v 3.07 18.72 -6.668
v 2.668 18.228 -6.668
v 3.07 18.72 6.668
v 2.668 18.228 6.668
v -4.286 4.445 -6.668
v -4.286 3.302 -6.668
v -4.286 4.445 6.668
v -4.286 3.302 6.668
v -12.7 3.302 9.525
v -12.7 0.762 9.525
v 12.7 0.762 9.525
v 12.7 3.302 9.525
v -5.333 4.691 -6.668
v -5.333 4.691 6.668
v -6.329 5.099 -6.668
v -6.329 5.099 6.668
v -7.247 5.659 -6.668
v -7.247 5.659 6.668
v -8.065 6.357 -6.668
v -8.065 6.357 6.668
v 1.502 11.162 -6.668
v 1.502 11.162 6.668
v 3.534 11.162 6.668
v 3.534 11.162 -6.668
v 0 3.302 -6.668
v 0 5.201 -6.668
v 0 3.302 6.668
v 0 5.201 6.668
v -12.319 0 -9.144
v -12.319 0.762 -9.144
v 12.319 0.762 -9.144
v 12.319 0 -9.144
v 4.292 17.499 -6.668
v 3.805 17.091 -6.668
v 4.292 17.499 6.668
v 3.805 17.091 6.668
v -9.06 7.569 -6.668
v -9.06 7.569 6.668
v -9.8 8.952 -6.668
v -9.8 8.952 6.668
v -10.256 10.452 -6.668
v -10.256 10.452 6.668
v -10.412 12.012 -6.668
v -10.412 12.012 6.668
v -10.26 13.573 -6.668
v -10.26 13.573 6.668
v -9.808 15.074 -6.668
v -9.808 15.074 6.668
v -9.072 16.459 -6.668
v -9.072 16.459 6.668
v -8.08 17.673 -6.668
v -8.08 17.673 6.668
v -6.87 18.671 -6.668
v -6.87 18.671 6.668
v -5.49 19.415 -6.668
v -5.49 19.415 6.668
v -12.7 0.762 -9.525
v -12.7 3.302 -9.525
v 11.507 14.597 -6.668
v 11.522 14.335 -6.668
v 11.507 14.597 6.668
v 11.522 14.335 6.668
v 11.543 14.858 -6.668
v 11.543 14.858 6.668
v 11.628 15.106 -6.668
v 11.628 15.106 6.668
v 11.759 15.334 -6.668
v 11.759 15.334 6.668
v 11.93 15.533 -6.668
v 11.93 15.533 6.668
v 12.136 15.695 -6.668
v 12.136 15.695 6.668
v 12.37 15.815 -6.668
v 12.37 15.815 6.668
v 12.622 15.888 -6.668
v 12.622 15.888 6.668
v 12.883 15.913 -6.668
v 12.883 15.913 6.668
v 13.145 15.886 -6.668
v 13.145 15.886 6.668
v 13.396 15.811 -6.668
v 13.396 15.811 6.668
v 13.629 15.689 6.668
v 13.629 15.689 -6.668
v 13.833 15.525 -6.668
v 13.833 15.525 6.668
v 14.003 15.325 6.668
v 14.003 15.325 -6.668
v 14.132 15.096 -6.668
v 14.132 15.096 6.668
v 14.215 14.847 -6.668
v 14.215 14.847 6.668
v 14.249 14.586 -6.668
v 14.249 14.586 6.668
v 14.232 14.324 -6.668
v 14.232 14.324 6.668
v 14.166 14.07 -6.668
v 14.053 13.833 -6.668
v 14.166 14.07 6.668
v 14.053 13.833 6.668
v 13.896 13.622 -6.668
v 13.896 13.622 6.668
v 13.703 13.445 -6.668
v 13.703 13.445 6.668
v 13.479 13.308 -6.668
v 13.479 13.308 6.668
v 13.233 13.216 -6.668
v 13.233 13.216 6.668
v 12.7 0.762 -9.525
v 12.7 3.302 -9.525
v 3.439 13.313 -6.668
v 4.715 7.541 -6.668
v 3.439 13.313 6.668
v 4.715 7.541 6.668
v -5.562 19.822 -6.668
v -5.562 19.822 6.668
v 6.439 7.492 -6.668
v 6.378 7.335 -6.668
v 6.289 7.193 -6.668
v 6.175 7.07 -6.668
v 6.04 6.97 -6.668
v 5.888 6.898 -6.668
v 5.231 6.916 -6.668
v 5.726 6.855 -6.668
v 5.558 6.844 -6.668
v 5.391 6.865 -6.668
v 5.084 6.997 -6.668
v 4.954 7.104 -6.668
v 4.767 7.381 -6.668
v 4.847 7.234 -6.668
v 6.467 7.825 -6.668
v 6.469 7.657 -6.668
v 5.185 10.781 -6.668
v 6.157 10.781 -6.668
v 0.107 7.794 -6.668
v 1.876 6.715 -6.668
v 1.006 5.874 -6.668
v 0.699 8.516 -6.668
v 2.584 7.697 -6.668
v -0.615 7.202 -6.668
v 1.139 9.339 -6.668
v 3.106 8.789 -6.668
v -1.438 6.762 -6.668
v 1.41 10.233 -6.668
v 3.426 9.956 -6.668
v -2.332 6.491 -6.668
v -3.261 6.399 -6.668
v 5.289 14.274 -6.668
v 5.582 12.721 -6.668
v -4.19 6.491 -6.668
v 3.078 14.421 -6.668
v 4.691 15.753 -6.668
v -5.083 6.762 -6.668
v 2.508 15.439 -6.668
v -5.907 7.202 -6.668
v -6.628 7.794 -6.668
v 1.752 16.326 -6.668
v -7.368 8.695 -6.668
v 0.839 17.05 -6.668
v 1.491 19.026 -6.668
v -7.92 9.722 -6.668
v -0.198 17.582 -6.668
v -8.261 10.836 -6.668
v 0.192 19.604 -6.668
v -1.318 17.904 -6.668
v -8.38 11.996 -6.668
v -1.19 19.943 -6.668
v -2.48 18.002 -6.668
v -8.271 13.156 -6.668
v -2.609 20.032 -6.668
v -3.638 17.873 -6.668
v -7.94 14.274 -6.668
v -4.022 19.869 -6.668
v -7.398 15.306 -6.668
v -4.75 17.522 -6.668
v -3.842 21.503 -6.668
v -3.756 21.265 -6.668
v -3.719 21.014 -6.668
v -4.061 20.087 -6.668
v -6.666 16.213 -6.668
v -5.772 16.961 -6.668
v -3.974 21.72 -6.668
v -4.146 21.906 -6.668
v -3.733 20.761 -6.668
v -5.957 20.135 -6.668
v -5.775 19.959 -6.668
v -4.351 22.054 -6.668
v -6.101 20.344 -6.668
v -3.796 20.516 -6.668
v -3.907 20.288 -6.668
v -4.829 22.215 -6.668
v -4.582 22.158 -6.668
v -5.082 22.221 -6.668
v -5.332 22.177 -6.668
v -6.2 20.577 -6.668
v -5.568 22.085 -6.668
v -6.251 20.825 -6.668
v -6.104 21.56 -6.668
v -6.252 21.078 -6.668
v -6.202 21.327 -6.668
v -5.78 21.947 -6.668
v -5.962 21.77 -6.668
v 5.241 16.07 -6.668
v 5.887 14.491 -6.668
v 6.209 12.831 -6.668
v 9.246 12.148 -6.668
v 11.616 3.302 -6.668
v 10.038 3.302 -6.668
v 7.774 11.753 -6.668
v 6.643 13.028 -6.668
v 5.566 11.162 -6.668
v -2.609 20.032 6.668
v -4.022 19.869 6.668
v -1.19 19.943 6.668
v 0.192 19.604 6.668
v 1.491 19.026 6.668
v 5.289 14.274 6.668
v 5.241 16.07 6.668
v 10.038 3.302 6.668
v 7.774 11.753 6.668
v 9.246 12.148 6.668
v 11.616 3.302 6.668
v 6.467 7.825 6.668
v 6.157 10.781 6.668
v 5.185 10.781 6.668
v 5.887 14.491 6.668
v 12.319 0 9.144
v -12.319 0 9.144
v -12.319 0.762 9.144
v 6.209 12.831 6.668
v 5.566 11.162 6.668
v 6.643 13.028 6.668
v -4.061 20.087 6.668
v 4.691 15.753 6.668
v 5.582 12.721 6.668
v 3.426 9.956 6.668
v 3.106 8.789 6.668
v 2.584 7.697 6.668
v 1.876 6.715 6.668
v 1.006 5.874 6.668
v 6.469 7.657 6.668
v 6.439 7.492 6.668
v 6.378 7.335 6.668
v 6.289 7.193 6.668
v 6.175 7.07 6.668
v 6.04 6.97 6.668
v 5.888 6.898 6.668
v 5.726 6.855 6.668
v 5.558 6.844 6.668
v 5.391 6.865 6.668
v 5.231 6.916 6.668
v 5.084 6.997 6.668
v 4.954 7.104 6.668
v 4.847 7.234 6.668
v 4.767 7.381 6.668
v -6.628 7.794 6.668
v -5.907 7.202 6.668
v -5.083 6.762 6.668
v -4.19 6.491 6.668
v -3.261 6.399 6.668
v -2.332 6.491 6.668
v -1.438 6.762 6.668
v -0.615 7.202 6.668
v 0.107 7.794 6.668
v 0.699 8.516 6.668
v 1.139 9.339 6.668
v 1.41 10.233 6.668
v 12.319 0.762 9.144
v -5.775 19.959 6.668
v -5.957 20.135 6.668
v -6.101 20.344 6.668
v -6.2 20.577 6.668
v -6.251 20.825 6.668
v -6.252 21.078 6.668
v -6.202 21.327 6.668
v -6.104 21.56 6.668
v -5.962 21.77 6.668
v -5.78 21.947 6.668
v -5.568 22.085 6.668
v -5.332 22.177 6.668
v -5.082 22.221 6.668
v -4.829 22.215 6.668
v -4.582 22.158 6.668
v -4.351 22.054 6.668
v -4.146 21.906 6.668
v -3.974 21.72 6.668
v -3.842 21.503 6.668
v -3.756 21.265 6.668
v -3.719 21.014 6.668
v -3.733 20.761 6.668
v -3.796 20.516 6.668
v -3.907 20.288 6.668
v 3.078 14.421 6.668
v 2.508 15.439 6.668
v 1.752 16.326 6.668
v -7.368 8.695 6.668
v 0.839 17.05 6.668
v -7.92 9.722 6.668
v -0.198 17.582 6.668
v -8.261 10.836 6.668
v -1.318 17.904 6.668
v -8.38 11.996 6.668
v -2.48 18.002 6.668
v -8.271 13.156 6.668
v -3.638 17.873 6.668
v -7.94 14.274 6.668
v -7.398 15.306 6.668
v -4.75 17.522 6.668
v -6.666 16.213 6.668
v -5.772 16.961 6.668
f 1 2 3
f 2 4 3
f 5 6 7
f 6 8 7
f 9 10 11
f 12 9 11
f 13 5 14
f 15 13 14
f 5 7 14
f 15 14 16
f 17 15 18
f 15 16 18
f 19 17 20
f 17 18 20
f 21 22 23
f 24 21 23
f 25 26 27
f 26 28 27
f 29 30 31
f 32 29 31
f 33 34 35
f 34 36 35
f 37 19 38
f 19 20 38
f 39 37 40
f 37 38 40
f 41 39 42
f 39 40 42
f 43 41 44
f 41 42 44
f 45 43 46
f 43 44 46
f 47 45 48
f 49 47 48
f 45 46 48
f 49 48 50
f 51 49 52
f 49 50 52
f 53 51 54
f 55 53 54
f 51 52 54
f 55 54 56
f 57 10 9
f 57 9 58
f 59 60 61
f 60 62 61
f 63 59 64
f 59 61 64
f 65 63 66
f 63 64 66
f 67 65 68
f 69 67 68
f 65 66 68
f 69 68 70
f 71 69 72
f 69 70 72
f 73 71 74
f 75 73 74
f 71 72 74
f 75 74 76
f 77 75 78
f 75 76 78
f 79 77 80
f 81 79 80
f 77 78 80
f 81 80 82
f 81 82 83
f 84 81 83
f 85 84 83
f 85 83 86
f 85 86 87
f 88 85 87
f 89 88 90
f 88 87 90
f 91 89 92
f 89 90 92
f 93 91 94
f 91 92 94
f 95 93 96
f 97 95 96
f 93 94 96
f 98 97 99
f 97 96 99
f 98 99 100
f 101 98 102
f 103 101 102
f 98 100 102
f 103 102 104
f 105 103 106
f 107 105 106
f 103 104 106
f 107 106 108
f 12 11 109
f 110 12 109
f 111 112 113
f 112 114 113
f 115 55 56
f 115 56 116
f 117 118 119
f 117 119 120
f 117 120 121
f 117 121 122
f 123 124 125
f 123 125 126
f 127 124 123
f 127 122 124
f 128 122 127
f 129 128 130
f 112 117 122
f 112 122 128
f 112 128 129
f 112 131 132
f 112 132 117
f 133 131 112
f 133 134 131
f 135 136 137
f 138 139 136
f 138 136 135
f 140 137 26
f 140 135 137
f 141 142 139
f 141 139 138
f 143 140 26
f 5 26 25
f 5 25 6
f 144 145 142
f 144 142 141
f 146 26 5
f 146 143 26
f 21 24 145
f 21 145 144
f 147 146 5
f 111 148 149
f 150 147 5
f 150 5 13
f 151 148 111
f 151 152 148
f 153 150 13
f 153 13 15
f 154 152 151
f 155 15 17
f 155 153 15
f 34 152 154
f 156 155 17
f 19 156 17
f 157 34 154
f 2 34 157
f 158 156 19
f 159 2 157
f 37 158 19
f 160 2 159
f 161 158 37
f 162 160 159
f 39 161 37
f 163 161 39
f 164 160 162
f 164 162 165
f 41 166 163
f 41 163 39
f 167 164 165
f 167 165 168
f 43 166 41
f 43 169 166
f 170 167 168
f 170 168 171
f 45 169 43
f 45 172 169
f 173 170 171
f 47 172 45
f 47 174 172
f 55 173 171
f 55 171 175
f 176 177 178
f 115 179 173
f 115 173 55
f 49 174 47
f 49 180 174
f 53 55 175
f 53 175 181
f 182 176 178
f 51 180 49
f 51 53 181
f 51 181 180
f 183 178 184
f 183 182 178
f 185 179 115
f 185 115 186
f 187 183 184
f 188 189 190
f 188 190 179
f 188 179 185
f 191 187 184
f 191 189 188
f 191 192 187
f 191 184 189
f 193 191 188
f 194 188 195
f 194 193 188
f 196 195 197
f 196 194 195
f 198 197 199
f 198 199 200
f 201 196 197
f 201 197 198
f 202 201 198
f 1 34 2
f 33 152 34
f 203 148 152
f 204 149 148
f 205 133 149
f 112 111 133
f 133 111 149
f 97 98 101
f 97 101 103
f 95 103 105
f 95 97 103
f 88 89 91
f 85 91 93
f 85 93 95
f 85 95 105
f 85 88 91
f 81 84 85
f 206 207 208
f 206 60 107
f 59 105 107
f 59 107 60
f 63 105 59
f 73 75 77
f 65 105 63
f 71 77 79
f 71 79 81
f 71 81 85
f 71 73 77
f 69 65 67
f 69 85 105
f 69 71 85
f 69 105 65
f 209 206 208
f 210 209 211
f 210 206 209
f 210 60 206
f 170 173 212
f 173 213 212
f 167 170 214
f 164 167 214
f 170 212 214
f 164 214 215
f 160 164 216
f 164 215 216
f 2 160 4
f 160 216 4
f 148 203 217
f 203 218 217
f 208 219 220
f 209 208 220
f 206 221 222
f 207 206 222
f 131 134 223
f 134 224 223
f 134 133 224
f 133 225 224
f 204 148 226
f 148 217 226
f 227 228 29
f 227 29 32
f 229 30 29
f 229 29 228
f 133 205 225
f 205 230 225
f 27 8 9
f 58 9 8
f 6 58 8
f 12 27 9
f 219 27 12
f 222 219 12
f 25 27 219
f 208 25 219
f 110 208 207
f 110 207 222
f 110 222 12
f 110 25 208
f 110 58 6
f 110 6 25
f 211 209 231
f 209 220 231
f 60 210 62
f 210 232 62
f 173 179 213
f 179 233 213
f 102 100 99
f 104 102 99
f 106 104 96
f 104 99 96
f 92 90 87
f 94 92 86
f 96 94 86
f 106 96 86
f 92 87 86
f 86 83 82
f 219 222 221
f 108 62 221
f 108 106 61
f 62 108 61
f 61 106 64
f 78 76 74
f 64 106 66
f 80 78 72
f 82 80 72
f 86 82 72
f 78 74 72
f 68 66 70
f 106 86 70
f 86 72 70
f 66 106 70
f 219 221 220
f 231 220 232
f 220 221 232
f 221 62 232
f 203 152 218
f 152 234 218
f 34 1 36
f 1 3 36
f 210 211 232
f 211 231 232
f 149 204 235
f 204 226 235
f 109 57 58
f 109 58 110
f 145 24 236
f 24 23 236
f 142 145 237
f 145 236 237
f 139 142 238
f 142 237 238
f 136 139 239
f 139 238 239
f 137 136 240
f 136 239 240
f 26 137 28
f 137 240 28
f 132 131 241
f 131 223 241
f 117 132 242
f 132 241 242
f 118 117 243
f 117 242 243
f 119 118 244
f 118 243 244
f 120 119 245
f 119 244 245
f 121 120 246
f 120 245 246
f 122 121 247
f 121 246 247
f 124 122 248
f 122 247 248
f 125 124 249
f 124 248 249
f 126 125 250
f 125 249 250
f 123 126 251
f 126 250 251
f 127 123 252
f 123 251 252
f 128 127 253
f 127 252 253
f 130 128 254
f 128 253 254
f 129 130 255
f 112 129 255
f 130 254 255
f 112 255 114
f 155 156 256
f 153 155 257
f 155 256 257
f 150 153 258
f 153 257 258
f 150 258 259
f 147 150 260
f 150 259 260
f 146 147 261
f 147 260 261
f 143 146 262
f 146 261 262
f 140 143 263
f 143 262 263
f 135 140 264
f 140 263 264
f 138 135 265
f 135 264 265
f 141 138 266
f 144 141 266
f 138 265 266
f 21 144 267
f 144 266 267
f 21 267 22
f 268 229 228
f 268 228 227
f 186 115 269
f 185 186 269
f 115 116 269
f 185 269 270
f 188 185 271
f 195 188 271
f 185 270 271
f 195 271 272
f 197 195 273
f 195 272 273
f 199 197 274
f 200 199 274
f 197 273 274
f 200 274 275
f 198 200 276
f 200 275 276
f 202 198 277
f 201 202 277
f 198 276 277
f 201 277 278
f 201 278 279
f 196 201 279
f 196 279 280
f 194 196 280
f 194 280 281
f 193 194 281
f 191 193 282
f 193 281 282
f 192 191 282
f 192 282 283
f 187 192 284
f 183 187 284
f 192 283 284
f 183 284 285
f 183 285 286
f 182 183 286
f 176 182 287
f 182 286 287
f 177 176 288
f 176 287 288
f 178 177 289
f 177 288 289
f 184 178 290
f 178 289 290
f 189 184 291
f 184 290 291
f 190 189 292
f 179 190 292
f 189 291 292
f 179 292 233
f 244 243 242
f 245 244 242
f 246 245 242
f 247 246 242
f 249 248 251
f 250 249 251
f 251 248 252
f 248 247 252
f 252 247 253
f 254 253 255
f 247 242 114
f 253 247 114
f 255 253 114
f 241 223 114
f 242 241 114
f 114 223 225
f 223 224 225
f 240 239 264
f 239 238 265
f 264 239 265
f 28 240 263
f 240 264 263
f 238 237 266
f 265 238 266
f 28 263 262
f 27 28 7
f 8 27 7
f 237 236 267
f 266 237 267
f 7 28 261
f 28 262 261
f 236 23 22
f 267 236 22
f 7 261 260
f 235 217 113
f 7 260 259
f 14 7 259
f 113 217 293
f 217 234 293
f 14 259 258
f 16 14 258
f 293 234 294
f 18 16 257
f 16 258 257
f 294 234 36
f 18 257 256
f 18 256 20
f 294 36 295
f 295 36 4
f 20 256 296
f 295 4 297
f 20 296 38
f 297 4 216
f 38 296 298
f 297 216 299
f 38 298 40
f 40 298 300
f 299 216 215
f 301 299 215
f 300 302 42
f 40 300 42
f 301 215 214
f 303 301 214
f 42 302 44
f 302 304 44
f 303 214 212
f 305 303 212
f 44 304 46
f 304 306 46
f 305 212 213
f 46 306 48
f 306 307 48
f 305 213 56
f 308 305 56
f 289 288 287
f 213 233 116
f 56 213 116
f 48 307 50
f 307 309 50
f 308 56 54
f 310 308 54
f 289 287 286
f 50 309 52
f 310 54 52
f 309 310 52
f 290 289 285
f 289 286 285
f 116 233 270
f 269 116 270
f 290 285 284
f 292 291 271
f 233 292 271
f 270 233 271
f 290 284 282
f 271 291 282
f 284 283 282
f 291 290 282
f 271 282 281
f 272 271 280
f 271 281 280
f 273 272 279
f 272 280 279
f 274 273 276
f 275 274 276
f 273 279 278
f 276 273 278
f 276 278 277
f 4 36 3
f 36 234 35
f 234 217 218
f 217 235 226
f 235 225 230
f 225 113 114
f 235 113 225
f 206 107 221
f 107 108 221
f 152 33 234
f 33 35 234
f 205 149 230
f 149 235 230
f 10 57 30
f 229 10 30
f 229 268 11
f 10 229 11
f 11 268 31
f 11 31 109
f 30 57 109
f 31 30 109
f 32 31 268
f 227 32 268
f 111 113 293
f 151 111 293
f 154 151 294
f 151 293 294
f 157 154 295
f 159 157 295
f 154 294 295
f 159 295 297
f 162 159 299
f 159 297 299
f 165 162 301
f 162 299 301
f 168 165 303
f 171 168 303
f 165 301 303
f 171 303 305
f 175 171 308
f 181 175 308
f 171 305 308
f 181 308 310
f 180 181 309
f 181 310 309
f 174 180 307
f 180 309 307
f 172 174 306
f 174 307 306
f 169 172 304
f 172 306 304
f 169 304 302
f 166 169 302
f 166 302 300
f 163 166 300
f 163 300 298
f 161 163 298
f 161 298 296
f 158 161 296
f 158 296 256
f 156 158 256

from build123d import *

# Parameters (mm, degrees)
BOSS_EXTRUDE1_START = 0.762
SKETCH1_W           = 25.4
SKETCH1_H           = 19.05
BOSS_EXTRUDE1_DEPTH = 2.54
SKETCH2_W           = 24.638
SKETCH2_H           = 18.288
BOSS_EXTRUDE2_DEPTH = 0.762
BOSS_EXTRUDE3_DEPTH = 6.6675
BOSS_EXTRUDE4_DEPTH = 6.6675


with BuildPart() as part:
    # Sketch1 → Boss-Extrude1 (new body)
    with BuildSketch(Plane(origin=(0, 0, 0), x_dir=(1, 0, 0), z_dir=(0, 1, 0)).offset(BOSS_EXTRUDE1_START)):
        Rectangle(SKETCH1_W, SKETCH1_H)
    extrude(amount=BOSS_EXTRUDE1_DEPTH)

    # Sketch2 → Boss-Extrude2 (add)
    with BuildSketch(Plane.XZ.offset(-0.762)):
        Rectangle(SKETCH2_W, SKETCH2_H)
    extrude(amount=BOSS_EXTRUDE2_DEPTH)

    # Sketch4 → Boss-Extrude3 (add, symmetric)
    with BuildSketch(Plane.XY):
        with BuildLine():
            Line((1.501676205, 11.161675617), (3.533676205, 11.161675617))
            ThreePointArc((3.533676205, 11.161675617), (2.583870274, 7.696883923), (0, 5.200781521))
            Line((0, 5.200781521), (0, 3.302))
            Line((0, 3.302), (-4.28625, 3.302))
            Line((-4.28625, 3.302), (-4.28625, 4.445))
            ThreePointArc((-4.28625, 4.445), (-6.328557556, 5.099148106), (-8.06526082, 6.357238593))
            ThreePointArc((-8.06526082, 6.357238593), (-10.260478652, 13.572969866), (-5.489821493, 19.414766629))
            Line((-5.489821493, 19.414766629), (-5.561648074, 19.822115412))
            ThreePointArc((-5.561648074, 19.822115412), (-5.2081843, 22.205705846), (-4.060801058, 20.086755234))
            Line((-4.060801058, 20.086755234), (-4.022330337, 19.86857693))
            ThreePointArc((-4.022330337, 19.86857693), (-0.491642159, 19.803987548), (2.668342576, 18.227780941))
            Line((2.668342576, 18.227780941), (3.070034491, 18.719582328))
            Line((3.070034491, 18.719582328), (3.805281528, 17.090841988))
            Line((3.805281528, 17.090841988), (4.291759283, 17.499045293))
            Line((4.291759283, 17.499045293), (4.690845695, 15.752574138))
            Line((4.690845695, 15.752574138), (5.241166338, 16.07030191))
            Line((5.241166338, 16.07030191), (5.289319806, 14.273673387))
            Line((5.289319806, 14.273673387), (5.887168028, 14.491272344))
            Line((5.887168028, 14.491272344), (5.581577343, 12.720829512))
            Line((5.581577343, 12.720829512), (6.209142893, 12.831486251))
            Line((6.209142893, 12.831486251), (5.184676205, 10.780675617))
            Line((5.184676205, 10.780675617), (6.157416197, 10.780675617))
            Line((6.157416197, 10.780675617), (6.467196887, 7.825354003))
            ThreePointArc((6.467196887, 7.825354003), (5.725539877, 6.855170599), (4.714991862, 7.540811663))
            Line((4.714991862, 7.540811663), (3.439133103, 13.313172794))
            ThreePointArc((3.439133103, 13.313172794), (-5.274572471, 17.26630154), (-6.628419841, 7.794079572))
            ThreePointArc((-6.628419841, 7.794079572), (-1.438293949, 6.761699344), (1.501676205, 11.161675617))
        make_face()
    extrude(amount=BOSS_EXTRUDE3_DEPTH, both=True)

    # Sketch3 → Boss-Extrude4 (add, symmetric)
    with BuildSketch(Plane.XY):
        with BuildLine():
            Line((10.038311288, 3.302), (7.773782644, 11.753335954))
            Line((7.773782644, 11.753335954), (5.565676205, 11.161675617))
            Line((5.565676205, 11.161675617), (6.643306939, 13.028186801))
            Line((6.643306939, 13.028186801), (11.521611933, 14.335324685))
            ThreePointArc((11.521611933, 14.335324685), (13.628547334, 15.688756773), (13.232712451, 13.216051788))
            Line((13.232712451, 13.216051788), (9.245853603, 12.147776179))
            Line((9.245853603, 12.147776179), (11.616072187, 3.302))
            Line((11.616072187, 3.302), (10.038311288, 3.302))
        make_face()
    extrude(amount=BOSS_EXTRUDE4_DEPTH, both=True)


solid = part.part
